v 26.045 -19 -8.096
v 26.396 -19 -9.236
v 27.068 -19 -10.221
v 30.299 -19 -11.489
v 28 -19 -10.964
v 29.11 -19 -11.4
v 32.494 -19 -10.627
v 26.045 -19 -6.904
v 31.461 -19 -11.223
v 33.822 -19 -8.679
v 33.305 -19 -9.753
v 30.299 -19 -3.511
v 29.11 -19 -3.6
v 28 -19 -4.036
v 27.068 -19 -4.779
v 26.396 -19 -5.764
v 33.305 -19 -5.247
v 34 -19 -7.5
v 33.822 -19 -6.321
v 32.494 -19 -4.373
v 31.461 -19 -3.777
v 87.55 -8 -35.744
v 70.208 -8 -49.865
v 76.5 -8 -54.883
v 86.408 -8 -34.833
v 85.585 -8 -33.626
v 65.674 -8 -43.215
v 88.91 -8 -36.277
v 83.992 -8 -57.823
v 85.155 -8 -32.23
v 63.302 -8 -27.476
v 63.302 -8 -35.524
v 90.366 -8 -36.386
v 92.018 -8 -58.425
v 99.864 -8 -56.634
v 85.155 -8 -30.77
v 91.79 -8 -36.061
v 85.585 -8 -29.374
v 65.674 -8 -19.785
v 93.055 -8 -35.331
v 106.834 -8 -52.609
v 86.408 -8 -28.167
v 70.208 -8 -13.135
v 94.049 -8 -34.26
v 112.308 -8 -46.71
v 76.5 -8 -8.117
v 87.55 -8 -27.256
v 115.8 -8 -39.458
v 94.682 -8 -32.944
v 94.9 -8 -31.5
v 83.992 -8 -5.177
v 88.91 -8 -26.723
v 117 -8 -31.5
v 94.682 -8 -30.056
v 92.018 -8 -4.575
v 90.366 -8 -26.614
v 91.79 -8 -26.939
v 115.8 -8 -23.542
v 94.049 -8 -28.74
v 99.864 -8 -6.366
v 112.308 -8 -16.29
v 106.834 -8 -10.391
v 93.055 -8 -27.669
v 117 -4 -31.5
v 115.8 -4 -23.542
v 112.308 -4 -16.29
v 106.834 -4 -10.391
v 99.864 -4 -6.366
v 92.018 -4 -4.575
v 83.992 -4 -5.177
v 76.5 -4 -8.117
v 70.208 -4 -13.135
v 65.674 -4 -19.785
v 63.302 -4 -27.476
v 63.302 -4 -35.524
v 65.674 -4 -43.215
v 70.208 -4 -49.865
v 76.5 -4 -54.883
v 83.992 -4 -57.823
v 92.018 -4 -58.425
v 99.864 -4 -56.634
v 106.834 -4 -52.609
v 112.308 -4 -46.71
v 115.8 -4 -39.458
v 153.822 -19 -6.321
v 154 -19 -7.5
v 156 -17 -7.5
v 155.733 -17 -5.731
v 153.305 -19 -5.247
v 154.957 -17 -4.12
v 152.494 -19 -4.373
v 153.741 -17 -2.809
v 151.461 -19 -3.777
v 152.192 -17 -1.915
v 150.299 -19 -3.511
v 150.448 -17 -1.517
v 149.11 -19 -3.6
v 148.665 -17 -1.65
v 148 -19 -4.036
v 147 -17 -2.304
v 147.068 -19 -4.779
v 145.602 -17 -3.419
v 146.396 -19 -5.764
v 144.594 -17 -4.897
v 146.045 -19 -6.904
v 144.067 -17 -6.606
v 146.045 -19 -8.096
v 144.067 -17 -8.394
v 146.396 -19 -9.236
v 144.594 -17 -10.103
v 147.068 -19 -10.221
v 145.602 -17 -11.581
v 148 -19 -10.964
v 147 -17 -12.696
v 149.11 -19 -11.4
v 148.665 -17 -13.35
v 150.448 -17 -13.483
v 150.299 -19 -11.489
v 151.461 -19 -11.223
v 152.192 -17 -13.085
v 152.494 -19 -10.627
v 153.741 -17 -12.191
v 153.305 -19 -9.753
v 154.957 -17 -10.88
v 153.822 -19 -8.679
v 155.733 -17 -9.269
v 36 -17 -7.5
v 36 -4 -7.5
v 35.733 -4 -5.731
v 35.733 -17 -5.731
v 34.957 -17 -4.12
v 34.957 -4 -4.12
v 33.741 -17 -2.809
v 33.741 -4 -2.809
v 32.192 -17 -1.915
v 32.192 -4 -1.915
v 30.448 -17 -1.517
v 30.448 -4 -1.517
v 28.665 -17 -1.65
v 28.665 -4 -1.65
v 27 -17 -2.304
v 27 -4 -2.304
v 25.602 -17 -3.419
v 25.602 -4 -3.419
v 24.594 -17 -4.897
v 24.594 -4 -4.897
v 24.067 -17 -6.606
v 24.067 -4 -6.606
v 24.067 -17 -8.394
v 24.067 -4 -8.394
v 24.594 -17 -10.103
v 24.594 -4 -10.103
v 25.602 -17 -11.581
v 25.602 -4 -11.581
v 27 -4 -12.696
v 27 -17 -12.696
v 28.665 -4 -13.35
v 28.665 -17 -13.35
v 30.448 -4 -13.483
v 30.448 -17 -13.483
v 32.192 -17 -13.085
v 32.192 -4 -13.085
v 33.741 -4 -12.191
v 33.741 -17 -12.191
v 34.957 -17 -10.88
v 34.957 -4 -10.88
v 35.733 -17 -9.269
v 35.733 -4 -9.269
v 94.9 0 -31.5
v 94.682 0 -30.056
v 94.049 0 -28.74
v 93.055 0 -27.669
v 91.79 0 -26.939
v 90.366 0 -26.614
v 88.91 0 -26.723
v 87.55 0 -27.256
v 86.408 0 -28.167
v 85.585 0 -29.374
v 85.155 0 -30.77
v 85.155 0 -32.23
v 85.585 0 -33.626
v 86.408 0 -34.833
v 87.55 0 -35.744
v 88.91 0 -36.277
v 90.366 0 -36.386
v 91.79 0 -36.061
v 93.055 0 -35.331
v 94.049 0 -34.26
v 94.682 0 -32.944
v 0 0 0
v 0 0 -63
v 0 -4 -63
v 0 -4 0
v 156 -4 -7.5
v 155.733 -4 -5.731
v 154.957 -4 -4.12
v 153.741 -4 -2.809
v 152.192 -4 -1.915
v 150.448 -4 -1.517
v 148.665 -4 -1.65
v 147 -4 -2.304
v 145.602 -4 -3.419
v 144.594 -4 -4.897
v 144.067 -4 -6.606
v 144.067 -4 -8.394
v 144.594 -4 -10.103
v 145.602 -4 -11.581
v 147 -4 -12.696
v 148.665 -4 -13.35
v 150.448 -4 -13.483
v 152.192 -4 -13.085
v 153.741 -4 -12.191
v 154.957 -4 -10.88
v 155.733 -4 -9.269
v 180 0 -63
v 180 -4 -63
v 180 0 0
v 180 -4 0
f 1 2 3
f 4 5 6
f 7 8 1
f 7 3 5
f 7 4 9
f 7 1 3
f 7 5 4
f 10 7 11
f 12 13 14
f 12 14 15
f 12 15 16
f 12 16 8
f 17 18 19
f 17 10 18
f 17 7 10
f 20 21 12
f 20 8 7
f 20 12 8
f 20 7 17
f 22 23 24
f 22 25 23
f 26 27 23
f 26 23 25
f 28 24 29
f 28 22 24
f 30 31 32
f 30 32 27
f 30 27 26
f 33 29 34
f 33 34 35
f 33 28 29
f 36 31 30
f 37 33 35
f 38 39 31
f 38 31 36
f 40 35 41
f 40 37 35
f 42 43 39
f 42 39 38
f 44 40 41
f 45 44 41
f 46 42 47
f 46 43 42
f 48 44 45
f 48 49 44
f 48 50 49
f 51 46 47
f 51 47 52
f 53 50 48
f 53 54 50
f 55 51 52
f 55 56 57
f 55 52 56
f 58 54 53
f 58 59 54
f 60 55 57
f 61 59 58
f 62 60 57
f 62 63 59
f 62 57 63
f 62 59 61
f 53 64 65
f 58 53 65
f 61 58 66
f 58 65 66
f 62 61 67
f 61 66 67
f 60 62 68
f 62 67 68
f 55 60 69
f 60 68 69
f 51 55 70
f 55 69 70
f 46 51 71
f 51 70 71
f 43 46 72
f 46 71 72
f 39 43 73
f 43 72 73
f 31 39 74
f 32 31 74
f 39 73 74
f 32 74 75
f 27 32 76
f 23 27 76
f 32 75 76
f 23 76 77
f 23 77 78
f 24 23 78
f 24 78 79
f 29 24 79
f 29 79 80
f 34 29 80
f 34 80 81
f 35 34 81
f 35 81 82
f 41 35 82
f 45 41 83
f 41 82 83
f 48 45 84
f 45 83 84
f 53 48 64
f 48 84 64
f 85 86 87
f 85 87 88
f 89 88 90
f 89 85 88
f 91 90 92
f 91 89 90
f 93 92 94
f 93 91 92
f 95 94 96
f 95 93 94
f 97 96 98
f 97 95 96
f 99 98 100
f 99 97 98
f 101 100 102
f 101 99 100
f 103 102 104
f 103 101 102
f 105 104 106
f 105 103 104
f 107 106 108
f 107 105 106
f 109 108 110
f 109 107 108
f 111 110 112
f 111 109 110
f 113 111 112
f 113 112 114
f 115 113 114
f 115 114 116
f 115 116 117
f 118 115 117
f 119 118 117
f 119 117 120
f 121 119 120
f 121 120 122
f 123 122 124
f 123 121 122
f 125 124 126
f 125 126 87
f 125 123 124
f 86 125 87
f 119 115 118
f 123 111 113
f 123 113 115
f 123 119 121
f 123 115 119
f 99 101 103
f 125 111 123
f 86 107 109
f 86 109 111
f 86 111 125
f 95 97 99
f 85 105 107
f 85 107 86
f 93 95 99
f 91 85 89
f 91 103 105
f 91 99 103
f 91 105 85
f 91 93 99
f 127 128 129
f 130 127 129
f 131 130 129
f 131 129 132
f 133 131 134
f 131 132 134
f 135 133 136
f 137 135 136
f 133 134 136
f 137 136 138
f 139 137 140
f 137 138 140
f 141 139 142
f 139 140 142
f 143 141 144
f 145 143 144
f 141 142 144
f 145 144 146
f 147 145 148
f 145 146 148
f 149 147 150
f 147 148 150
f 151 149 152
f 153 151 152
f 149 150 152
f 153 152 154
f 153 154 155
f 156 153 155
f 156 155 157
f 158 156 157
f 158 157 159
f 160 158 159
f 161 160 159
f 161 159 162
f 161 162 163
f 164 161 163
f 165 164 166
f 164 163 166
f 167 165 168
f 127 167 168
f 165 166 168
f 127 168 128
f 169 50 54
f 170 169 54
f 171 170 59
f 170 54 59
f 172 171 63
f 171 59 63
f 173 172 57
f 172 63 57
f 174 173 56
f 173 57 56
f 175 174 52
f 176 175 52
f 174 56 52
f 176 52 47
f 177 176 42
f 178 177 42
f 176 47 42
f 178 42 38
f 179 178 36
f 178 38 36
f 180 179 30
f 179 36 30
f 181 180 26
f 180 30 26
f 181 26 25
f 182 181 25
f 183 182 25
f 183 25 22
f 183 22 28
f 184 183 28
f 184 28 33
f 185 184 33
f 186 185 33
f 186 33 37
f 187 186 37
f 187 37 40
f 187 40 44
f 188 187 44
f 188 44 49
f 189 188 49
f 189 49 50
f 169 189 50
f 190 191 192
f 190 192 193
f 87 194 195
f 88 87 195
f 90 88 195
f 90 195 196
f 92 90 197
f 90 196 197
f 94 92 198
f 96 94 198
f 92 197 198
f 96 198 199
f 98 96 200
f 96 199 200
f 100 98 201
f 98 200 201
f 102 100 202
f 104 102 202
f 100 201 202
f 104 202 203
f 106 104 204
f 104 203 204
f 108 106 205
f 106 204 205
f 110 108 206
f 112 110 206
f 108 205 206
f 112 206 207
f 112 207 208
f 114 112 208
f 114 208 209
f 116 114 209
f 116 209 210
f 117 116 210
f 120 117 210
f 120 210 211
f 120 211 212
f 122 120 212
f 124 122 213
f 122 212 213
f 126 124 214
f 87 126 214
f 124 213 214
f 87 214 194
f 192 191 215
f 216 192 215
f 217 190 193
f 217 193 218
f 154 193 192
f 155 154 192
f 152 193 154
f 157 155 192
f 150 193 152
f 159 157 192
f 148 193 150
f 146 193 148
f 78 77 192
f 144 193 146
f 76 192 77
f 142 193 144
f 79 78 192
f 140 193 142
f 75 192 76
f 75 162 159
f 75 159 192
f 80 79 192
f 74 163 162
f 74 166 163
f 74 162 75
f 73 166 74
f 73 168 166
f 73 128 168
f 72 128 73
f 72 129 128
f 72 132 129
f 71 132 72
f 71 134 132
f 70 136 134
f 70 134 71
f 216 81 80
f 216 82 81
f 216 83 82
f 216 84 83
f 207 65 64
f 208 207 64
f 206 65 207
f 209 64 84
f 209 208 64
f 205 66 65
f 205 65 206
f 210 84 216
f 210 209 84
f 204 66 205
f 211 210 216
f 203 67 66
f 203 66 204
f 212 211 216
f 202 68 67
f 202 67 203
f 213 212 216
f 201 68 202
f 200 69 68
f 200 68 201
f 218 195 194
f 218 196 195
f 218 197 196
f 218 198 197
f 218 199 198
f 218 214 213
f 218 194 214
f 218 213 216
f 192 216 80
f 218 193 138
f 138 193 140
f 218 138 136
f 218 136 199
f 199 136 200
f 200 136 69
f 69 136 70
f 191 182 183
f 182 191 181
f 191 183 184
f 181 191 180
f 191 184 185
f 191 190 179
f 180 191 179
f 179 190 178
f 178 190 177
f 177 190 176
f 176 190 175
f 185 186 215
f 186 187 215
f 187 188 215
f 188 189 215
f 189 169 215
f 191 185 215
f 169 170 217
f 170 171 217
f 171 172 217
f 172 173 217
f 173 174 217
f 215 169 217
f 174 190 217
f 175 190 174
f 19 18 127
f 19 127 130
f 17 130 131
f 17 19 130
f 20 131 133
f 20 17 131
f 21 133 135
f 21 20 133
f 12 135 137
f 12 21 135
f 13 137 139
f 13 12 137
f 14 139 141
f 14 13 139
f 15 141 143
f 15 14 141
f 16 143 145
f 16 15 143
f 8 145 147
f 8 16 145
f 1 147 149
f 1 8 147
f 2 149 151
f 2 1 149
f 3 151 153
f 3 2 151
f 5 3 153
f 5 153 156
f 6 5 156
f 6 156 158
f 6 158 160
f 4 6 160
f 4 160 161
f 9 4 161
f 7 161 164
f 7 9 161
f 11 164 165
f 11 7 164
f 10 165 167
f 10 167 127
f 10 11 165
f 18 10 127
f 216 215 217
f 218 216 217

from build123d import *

# Parameters (mm, degrees)
F0_W     = 180
F0_H     = 63
F1_DEPTH = 4
F2_R     = 27
F3_DEPTH = 4
F2_R_2   = 6
F4_DEPTH = 15
F5_SIZE  = 2
F6_R     = 4.9
F7_DEPTH = 25


with BuildPart() as f1:
    # F0 (on Front) → F1 (new body)
    with BuildSketch(Plane.XZ):
        with Locations((90, -31.5)):
            Rectangle(F0_W, F0_H)
    extrude(amount=F1_DEPTH)

    # F2 (on face) → F3 (join)
    with BuildSketch(Plane.XZ.offset(4)):
        with Locations((90, -31.5)):
            Circle(F2_R)
    extrude(amount=F3_DEPTH)

    # F2 (on face) → F4 (join)
    with BuildSketch(Plane.XZ.offset(4)):
        with Locations((30, -7.5)):
            Circle(F2_R_2)
        with Locations((150, -7.5)):
            Circle(F2_R_2)
    extrude(amount=F4_DEPTH)

    # F5
    f5_edges = [f1.edges().sort_by_distance(p)[0] for p in [
        (24, -19, -7.5),
        (144, -19, -7.5),
    ]]
    chamfer(f5_edges, length=F5_SIZE)

    # F6 (on face) → F7 (cut)
    with BuildSketch(Plane.XZ.offset(8)):
        with Locations((90, -31.5)):
            Circle(F6_R)
    extrude(amount=-F7_DEPTH, mode=Mode.SUBTRACT)


solid = f1.part
